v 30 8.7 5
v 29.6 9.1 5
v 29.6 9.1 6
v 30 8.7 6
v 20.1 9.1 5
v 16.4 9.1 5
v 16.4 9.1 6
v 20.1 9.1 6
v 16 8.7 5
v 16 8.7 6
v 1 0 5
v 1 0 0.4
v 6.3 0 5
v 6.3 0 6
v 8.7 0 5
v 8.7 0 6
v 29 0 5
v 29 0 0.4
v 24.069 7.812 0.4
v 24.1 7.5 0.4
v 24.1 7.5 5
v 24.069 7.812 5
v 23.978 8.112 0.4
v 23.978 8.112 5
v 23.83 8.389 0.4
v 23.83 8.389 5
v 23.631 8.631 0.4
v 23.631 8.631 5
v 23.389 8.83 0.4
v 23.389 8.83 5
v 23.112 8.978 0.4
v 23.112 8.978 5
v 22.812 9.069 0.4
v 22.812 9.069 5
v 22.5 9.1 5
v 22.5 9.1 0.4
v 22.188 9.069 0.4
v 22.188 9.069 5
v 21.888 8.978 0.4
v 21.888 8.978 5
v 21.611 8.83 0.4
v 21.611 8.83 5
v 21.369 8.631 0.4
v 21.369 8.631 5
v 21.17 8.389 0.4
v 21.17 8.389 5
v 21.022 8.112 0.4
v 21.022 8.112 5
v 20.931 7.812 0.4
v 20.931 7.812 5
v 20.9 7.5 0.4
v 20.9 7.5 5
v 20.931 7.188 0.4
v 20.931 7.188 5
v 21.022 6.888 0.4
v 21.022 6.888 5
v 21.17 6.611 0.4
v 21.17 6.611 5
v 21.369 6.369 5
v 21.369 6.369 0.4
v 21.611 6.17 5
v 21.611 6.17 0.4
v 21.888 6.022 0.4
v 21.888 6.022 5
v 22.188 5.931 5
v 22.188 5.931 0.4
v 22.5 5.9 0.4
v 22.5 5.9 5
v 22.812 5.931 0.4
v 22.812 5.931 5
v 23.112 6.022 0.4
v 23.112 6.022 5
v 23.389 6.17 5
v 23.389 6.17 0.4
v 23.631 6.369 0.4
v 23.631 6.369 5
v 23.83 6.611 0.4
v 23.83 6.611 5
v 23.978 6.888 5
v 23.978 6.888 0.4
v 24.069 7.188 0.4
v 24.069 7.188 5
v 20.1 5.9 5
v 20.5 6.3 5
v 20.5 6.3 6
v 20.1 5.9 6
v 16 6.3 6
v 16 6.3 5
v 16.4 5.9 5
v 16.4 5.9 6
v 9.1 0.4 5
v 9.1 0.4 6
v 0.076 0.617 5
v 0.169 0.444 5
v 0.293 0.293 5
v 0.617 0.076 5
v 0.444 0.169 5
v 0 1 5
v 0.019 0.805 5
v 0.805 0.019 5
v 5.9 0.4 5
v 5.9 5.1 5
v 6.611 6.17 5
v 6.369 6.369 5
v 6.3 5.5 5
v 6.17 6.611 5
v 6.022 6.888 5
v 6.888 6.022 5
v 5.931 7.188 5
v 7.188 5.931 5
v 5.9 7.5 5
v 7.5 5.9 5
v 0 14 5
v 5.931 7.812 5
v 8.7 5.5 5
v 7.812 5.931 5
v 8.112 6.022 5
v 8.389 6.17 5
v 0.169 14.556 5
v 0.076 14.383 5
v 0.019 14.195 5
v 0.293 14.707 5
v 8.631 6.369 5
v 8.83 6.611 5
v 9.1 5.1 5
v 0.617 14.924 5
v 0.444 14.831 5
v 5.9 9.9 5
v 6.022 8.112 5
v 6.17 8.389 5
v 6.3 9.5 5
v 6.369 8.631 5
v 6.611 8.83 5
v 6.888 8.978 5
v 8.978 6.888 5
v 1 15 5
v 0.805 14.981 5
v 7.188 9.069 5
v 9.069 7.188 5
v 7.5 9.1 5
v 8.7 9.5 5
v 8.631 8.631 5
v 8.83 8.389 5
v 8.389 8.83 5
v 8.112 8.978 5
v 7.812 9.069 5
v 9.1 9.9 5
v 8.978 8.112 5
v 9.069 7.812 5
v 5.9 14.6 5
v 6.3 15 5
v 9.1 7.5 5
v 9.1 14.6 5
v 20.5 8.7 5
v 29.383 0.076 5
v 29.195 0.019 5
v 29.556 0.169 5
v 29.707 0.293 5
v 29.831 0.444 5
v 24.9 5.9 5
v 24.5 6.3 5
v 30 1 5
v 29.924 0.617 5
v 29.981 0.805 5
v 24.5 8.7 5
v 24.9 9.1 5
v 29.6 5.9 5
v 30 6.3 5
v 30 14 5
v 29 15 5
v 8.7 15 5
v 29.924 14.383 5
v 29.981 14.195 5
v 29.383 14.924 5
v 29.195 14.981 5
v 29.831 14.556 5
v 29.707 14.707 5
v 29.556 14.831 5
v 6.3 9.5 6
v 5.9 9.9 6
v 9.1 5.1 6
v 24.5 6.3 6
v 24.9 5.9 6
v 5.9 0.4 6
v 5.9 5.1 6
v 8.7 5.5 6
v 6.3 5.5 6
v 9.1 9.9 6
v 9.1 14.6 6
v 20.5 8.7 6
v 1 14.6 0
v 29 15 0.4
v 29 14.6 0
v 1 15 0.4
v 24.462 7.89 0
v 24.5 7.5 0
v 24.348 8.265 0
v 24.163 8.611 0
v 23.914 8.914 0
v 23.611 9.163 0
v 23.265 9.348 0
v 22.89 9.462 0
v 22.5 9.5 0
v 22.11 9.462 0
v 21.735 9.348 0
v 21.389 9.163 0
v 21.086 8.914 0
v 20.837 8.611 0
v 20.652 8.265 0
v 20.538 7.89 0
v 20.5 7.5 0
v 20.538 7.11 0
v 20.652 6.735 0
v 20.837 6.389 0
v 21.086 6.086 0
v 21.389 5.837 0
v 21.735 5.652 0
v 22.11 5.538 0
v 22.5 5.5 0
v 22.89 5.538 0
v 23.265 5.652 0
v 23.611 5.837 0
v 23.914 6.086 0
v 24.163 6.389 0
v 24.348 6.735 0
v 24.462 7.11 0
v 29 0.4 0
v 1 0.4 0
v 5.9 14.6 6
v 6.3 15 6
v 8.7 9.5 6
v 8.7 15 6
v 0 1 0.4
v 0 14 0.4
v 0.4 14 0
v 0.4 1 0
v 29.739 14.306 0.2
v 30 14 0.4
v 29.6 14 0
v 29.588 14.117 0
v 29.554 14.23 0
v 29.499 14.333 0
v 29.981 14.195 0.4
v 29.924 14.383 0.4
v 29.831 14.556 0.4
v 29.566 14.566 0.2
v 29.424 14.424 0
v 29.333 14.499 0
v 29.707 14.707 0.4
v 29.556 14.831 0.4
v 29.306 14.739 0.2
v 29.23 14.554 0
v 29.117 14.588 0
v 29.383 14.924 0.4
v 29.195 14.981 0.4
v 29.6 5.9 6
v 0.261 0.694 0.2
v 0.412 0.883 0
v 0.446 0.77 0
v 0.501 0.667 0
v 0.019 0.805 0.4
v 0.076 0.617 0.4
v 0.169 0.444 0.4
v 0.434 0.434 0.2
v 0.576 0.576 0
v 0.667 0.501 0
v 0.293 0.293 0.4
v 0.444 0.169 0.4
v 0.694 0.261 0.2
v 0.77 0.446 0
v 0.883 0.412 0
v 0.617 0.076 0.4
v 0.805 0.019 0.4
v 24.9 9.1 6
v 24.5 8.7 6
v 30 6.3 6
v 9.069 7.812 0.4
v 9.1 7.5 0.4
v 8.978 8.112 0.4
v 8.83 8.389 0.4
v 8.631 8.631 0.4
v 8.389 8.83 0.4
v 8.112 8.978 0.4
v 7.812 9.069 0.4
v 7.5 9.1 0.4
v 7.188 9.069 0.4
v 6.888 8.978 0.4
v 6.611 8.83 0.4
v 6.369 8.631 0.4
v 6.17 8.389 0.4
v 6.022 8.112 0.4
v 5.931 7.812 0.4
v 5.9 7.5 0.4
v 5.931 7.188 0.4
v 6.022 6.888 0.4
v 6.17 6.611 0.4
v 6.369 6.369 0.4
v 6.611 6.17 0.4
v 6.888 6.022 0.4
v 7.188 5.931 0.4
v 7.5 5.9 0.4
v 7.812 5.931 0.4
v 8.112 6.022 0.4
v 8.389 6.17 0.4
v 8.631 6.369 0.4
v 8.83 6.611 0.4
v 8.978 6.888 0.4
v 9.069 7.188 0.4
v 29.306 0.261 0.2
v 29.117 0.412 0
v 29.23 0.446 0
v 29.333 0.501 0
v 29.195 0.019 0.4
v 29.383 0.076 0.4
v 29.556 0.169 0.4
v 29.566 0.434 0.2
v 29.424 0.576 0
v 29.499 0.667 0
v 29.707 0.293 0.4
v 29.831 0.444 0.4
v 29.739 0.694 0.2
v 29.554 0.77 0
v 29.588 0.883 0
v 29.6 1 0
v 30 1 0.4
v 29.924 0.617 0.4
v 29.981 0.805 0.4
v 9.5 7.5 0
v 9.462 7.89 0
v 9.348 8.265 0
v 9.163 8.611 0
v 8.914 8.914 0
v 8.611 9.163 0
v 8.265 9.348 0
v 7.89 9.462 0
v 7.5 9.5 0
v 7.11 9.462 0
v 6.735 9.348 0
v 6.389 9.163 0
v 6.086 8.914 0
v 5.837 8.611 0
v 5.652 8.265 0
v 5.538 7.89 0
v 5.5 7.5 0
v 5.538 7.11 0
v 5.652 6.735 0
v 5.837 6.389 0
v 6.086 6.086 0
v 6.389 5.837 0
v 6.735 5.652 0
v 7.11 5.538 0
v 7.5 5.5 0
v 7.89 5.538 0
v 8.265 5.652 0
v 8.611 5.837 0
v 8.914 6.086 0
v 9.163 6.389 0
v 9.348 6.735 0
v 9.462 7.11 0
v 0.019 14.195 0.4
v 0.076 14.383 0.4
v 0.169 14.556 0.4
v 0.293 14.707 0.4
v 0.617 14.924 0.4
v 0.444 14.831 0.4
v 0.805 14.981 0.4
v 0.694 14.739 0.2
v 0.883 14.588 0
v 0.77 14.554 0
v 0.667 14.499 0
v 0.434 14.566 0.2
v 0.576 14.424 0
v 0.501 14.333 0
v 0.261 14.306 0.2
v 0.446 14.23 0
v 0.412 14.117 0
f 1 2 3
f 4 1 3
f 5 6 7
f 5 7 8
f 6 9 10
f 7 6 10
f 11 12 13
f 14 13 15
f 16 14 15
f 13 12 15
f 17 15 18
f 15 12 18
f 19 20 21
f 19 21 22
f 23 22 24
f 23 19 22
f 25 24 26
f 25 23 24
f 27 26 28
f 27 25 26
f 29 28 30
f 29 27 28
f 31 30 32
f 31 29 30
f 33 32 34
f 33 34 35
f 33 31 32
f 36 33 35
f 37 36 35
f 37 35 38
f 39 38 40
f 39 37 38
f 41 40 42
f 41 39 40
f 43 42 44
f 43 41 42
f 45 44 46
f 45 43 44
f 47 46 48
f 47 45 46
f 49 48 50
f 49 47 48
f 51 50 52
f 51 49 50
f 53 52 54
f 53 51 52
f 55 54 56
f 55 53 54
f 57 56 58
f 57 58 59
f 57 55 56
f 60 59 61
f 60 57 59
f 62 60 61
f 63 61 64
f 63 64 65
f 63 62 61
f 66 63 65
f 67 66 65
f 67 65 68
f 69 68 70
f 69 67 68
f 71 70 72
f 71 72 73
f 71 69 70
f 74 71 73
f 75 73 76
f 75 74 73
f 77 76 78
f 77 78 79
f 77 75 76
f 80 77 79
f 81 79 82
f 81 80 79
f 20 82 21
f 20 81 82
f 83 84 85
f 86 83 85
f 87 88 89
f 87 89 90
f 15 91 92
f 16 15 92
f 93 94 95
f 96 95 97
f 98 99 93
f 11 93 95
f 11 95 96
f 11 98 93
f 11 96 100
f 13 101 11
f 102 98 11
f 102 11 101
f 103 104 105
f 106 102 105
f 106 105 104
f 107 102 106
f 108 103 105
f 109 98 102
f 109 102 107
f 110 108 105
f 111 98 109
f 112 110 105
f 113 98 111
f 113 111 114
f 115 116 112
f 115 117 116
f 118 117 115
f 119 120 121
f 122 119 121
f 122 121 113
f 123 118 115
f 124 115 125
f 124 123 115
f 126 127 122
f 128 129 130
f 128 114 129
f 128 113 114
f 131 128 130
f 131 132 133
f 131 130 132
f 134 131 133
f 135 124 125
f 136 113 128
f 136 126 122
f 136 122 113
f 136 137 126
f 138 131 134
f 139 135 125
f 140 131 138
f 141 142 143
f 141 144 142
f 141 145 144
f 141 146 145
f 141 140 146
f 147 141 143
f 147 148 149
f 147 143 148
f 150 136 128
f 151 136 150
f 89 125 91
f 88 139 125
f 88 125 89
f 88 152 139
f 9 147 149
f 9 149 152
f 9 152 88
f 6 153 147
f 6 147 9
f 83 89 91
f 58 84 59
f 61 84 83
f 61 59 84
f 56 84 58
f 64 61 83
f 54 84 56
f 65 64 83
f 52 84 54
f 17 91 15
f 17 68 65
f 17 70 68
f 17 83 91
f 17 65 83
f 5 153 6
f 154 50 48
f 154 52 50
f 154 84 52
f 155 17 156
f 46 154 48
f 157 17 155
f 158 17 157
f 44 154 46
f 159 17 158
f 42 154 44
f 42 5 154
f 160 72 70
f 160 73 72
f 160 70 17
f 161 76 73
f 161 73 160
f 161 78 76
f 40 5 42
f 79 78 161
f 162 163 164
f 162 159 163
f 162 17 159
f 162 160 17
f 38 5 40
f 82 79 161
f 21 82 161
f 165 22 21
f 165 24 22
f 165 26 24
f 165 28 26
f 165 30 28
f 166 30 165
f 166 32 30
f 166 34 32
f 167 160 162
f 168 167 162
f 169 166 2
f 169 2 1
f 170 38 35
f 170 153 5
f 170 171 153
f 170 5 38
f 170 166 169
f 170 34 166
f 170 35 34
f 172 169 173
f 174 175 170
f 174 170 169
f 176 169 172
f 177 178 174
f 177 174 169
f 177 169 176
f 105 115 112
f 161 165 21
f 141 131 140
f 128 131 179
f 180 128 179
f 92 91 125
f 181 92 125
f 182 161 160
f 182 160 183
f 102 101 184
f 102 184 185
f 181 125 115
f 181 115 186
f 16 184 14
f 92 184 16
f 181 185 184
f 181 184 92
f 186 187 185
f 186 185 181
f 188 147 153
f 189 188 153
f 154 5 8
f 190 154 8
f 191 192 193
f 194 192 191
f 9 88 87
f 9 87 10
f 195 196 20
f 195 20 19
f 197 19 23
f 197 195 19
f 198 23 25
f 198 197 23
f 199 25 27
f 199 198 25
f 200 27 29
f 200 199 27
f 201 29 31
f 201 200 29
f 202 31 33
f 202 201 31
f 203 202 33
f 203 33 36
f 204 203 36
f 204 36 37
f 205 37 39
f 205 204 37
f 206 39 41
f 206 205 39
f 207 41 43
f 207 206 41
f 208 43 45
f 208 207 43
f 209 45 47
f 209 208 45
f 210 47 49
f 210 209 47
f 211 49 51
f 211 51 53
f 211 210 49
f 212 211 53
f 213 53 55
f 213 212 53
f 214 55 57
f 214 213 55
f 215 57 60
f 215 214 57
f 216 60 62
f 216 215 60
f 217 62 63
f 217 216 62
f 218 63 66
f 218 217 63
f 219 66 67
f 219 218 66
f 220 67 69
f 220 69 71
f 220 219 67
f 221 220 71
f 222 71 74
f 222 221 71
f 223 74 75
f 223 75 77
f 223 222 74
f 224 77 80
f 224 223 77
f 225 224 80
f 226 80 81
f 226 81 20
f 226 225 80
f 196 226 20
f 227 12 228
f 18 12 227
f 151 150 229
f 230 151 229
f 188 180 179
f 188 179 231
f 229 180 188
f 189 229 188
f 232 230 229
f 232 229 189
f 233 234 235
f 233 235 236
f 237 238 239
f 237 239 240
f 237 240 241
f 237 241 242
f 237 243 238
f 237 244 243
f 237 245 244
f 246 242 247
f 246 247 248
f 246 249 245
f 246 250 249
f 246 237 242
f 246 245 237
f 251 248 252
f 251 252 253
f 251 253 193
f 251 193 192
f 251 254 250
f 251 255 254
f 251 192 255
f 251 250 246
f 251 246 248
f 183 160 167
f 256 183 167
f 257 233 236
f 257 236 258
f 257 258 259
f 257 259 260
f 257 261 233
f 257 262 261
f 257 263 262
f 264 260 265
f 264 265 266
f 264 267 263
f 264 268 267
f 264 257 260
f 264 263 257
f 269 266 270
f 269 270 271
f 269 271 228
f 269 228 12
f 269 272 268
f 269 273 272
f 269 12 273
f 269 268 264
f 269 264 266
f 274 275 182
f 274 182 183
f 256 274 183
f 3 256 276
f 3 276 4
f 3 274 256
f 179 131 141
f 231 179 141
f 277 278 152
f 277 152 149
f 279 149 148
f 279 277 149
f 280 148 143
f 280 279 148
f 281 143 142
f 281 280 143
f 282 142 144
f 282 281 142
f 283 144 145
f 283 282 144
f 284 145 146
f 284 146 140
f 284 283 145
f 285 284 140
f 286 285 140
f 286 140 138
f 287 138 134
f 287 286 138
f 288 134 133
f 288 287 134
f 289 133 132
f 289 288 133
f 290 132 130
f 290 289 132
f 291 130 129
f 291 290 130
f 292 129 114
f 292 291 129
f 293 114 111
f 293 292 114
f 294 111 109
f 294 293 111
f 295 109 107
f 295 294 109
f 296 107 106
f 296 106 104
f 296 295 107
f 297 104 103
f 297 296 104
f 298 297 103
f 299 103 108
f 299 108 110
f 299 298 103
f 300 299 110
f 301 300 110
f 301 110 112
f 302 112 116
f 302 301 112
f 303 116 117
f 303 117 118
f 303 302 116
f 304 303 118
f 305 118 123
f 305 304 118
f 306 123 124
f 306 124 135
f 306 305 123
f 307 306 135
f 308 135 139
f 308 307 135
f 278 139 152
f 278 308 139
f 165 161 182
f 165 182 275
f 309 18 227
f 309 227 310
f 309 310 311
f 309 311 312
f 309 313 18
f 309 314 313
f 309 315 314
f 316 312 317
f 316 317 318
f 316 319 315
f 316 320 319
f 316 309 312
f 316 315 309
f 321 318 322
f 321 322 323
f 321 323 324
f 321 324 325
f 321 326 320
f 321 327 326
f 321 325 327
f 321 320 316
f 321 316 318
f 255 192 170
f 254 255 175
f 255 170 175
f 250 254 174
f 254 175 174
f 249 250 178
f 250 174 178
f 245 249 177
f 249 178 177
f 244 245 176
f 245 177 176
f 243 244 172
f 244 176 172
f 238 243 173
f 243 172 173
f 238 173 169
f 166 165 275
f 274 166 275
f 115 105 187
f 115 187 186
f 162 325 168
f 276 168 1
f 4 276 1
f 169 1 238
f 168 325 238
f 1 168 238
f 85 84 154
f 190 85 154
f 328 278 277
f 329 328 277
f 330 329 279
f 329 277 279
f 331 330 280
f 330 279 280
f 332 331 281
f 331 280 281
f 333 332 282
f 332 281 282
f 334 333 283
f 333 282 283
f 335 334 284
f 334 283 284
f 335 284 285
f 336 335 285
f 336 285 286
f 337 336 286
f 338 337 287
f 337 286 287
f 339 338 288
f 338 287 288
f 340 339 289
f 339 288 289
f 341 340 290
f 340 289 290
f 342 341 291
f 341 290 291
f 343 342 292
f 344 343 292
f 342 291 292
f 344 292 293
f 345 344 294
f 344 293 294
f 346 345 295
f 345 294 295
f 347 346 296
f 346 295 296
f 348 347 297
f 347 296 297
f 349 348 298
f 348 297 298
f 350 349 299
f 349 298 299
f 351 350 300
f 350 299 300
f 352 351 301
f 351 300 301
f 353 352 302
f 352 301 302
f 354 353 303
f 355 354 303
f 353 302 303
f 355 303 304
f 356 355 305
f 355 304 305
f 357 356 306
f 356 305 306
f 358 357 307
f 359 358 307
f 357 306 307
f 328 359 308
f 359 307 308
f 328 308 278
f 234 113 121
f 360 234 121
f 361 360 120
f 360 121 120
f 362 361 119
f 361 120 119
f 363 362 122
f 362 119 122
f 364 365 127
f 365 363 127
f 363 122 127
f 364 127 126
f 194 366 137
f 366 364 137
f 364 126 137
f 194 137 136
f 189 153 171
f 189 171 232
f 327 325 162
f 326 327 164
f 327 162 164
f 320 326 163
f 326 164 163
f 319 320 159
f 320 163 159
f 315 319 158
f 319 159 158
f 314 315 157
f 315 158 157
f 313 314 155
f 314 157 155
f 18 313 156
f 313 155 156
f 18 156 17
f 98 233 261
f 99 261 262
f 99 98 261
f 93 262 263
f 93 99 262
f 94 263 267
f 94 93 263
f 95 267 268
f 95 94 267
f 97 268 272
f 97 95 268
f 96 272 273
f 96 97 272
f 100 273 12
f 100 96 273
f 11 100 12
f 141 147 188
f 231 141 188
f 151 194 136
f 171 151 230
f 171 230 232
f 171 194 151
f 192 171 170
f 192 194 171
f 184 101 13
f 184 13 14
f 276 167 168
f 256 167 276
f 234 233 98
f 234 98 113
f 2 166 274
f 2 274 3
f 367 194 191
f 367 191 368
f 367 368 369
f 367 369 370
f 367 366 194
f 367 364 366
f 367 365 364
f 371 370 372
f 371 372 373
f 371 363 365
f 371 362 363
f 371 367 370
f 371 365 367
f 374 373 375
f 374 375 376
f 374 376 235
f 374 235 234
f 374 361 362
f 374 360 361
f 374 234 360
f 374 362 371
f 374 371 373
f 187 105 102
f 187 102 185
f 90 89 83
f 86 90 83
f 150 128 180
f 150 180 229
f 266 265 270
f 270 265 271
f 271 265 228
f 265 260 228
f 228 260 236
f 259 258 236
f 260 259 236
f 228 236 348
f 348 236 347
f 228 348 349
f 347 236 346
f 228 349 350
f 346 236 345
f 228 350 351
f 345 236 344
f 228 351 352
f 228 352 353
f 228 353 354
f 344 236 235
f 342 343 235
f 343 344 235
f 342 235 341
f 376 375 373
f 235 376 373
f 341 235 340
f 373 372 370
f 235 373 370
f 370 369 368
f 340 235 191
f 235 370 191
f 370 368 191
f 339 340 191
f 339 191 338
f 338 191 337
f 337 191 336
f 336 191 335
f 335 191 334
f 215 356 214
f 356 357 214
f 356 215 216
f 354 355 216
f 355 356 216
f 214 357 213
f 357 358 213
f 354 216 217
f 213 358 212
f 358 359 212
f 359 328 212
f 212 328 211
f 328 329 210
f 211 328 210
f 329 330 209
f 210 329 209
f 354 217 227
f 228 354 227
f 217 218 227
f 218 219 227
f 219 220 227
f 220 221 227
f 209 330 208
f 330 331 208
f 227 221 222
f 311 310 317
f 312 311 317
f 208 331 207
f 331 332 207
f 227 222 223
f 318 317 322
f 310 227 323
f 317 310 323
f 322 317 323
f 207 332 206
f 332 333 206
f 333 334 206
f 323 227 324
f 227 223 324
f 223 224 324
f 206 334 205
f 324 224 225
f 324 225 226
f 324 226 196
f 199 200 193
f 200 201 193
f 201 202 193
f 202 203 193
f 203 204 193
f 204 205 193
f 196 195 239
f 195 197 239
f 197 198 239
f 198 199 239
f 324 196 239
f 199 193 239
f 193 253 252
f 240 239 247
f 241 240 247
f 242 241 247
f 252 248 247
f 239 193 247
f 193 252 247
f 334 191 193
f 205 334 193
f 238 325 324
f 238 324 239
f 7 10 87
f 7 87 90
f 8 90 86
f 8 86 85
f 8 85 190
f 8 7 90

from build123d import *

# Parameters (mm, degrees)
SKETCH039_W                                      = 30
SKETCH039_H                                      = 15
SKETCH039_R                                      = 1.6
PAD008_DEPTH                                     = 5
SKETCH040_W                                      = 4.5
SKETCH040_H                                      = 3.2
SKETCH040_W_2                                    = 5.5
SKETCH040_W_3                                    = 3.2
SKETCH040_H_2                                    = 5.5
PAD009_DEPTH                                     = 1
PAD010_DEPTH                                     = 1
FILLET002_R                                      = 1
CHAMFER004013007011015006009007001005003045_SIZE = 0.4
CHAMFER004013007011015006009007001005003046_SIZE = 0.4


with BuildPart() as part:
    # Sketch039 → Pad008 (new body)
    with BuildSketch(Plane.XY):
        with Locations((15, 7.5)):
            Rectangle(SKETCH039_W, SKETCH039_H)
        with Locations((7.5, 7.5)):
            Circle(SKETCH039_R, mode=Mode.SUBTRACT)
        with Locations((22.5, 7.5)):
            Circle(SKETCH039_R, mode=Mode.SUBTRACT)
    extrude(amount=PAD008_DEPTH)

    # Sketch040 (on Face8 of Pad008) → Pad009 (join)
    with BuildSketch(Plane.XY.offset(5)):
        with Locations((18.25, 7.5)):
            Rectangle(SKETCH040_W, SKETCH040_H)
        with Locations((27.25, 7.5)):
            Rectangle(SKETCH040_W_2, SKETCH040_H)
        with Locations((7.5, 12.25)):
            Rectangle(SKETCH040_W_3, SKETCH040_H_2)
        with Locations((7.5, 2.75)):
            Rectangle(SKETCH040_W_3, SKETCH040_H_2)
    extrude(amount=PAD009_DEPTH)

    # Sketch040 (on Face8 of Pad008) → Pad010 (join)
    with BuildSketch(Plane.XY.offset(5)):
        with Locations((18.25, 7.5)):
            Rectangle(SKETCH040_W, SKETCH040_H)
        with Locations((27.25, 7.5)):
            Rectangle(SKETCH040_W_2, SKETCH040_H)
        with Locations((7.5, 12.25)):
            Rectangle(SKETCH040_W_3, SKETCH040_H_2)
        with Locations((7.5, 2.75)):
            Rectangle(SKETCH040_W_3, SKETCH040_H_2)
    extrude(amount=PAD010_DEPTH)

    # Fillet002
    fillet002_edges = [part.edges().sort_by_distance(p)[0] for p in [
        (30, 0, 2.5),
        (30, 15, 2.5),
        (0, 15, 2.5),
        (0, 0, 2.5),
    ]]
    fillet(fillet002_edges, radius=FILLET002_R)

    # Chamfer004013007011015006009007001005003045
    chamfer004013007011015006009007001005003045_edges = [part.edges().sort_by_distance(p)[0] for p in [
        (30, 9.1, 5.5),
        (24.5, 9.1, 5.5),
        (20.5, 9.1, 5.5),
        (16, 9.1, 5.5),
        (16, 5.9, 5.5),
        (9.1, 15, 5.5),
        (5.9, 15, 5.5),
        (9.1, 5.5, 5.5),
        (5.9, 5.5, 5.5),
        (5.9, 9.5, 5.5),
        (5.9, 0, 5.5),
        (9.1, 9.5, 5.5),
        (9.1, 0, 5.5),
        (20.5, 5.9, 5.5),
        (24.5, 5.9, 5.5),
        (30, 5.9, 5.5),
    ]]
    chamfer(chamfer004013007011015006009007001005003045_edges, length=CHAMFER004013007011015006009007001005003045_SIZE)

    # Chamfer004013007011015006009007001005003046
    chamfer004013007011015006009007001005003046_edges = [part.edges().sort_by_distance(p)[0] for p in [
        (15, 0, 0),
        (29.707107, 0.292893, 0),
        (30, 7.5, 0),
        (29.707107, 14.707107, 0),
        (15, 15, 0),
        (0.292893, 14.707107, 0),
        (0, 7.5, 0),
        (0.292893, 0.292893, 0),
        (20.9, 7.5, 0),
        (5.9, 7.5, 0),
    ]]
    chamfer(chamfer004013007011015006009007001005003046_edges, length=CHAMFER004013007011015006009007001005003046_SIZE)


solid = part.part
